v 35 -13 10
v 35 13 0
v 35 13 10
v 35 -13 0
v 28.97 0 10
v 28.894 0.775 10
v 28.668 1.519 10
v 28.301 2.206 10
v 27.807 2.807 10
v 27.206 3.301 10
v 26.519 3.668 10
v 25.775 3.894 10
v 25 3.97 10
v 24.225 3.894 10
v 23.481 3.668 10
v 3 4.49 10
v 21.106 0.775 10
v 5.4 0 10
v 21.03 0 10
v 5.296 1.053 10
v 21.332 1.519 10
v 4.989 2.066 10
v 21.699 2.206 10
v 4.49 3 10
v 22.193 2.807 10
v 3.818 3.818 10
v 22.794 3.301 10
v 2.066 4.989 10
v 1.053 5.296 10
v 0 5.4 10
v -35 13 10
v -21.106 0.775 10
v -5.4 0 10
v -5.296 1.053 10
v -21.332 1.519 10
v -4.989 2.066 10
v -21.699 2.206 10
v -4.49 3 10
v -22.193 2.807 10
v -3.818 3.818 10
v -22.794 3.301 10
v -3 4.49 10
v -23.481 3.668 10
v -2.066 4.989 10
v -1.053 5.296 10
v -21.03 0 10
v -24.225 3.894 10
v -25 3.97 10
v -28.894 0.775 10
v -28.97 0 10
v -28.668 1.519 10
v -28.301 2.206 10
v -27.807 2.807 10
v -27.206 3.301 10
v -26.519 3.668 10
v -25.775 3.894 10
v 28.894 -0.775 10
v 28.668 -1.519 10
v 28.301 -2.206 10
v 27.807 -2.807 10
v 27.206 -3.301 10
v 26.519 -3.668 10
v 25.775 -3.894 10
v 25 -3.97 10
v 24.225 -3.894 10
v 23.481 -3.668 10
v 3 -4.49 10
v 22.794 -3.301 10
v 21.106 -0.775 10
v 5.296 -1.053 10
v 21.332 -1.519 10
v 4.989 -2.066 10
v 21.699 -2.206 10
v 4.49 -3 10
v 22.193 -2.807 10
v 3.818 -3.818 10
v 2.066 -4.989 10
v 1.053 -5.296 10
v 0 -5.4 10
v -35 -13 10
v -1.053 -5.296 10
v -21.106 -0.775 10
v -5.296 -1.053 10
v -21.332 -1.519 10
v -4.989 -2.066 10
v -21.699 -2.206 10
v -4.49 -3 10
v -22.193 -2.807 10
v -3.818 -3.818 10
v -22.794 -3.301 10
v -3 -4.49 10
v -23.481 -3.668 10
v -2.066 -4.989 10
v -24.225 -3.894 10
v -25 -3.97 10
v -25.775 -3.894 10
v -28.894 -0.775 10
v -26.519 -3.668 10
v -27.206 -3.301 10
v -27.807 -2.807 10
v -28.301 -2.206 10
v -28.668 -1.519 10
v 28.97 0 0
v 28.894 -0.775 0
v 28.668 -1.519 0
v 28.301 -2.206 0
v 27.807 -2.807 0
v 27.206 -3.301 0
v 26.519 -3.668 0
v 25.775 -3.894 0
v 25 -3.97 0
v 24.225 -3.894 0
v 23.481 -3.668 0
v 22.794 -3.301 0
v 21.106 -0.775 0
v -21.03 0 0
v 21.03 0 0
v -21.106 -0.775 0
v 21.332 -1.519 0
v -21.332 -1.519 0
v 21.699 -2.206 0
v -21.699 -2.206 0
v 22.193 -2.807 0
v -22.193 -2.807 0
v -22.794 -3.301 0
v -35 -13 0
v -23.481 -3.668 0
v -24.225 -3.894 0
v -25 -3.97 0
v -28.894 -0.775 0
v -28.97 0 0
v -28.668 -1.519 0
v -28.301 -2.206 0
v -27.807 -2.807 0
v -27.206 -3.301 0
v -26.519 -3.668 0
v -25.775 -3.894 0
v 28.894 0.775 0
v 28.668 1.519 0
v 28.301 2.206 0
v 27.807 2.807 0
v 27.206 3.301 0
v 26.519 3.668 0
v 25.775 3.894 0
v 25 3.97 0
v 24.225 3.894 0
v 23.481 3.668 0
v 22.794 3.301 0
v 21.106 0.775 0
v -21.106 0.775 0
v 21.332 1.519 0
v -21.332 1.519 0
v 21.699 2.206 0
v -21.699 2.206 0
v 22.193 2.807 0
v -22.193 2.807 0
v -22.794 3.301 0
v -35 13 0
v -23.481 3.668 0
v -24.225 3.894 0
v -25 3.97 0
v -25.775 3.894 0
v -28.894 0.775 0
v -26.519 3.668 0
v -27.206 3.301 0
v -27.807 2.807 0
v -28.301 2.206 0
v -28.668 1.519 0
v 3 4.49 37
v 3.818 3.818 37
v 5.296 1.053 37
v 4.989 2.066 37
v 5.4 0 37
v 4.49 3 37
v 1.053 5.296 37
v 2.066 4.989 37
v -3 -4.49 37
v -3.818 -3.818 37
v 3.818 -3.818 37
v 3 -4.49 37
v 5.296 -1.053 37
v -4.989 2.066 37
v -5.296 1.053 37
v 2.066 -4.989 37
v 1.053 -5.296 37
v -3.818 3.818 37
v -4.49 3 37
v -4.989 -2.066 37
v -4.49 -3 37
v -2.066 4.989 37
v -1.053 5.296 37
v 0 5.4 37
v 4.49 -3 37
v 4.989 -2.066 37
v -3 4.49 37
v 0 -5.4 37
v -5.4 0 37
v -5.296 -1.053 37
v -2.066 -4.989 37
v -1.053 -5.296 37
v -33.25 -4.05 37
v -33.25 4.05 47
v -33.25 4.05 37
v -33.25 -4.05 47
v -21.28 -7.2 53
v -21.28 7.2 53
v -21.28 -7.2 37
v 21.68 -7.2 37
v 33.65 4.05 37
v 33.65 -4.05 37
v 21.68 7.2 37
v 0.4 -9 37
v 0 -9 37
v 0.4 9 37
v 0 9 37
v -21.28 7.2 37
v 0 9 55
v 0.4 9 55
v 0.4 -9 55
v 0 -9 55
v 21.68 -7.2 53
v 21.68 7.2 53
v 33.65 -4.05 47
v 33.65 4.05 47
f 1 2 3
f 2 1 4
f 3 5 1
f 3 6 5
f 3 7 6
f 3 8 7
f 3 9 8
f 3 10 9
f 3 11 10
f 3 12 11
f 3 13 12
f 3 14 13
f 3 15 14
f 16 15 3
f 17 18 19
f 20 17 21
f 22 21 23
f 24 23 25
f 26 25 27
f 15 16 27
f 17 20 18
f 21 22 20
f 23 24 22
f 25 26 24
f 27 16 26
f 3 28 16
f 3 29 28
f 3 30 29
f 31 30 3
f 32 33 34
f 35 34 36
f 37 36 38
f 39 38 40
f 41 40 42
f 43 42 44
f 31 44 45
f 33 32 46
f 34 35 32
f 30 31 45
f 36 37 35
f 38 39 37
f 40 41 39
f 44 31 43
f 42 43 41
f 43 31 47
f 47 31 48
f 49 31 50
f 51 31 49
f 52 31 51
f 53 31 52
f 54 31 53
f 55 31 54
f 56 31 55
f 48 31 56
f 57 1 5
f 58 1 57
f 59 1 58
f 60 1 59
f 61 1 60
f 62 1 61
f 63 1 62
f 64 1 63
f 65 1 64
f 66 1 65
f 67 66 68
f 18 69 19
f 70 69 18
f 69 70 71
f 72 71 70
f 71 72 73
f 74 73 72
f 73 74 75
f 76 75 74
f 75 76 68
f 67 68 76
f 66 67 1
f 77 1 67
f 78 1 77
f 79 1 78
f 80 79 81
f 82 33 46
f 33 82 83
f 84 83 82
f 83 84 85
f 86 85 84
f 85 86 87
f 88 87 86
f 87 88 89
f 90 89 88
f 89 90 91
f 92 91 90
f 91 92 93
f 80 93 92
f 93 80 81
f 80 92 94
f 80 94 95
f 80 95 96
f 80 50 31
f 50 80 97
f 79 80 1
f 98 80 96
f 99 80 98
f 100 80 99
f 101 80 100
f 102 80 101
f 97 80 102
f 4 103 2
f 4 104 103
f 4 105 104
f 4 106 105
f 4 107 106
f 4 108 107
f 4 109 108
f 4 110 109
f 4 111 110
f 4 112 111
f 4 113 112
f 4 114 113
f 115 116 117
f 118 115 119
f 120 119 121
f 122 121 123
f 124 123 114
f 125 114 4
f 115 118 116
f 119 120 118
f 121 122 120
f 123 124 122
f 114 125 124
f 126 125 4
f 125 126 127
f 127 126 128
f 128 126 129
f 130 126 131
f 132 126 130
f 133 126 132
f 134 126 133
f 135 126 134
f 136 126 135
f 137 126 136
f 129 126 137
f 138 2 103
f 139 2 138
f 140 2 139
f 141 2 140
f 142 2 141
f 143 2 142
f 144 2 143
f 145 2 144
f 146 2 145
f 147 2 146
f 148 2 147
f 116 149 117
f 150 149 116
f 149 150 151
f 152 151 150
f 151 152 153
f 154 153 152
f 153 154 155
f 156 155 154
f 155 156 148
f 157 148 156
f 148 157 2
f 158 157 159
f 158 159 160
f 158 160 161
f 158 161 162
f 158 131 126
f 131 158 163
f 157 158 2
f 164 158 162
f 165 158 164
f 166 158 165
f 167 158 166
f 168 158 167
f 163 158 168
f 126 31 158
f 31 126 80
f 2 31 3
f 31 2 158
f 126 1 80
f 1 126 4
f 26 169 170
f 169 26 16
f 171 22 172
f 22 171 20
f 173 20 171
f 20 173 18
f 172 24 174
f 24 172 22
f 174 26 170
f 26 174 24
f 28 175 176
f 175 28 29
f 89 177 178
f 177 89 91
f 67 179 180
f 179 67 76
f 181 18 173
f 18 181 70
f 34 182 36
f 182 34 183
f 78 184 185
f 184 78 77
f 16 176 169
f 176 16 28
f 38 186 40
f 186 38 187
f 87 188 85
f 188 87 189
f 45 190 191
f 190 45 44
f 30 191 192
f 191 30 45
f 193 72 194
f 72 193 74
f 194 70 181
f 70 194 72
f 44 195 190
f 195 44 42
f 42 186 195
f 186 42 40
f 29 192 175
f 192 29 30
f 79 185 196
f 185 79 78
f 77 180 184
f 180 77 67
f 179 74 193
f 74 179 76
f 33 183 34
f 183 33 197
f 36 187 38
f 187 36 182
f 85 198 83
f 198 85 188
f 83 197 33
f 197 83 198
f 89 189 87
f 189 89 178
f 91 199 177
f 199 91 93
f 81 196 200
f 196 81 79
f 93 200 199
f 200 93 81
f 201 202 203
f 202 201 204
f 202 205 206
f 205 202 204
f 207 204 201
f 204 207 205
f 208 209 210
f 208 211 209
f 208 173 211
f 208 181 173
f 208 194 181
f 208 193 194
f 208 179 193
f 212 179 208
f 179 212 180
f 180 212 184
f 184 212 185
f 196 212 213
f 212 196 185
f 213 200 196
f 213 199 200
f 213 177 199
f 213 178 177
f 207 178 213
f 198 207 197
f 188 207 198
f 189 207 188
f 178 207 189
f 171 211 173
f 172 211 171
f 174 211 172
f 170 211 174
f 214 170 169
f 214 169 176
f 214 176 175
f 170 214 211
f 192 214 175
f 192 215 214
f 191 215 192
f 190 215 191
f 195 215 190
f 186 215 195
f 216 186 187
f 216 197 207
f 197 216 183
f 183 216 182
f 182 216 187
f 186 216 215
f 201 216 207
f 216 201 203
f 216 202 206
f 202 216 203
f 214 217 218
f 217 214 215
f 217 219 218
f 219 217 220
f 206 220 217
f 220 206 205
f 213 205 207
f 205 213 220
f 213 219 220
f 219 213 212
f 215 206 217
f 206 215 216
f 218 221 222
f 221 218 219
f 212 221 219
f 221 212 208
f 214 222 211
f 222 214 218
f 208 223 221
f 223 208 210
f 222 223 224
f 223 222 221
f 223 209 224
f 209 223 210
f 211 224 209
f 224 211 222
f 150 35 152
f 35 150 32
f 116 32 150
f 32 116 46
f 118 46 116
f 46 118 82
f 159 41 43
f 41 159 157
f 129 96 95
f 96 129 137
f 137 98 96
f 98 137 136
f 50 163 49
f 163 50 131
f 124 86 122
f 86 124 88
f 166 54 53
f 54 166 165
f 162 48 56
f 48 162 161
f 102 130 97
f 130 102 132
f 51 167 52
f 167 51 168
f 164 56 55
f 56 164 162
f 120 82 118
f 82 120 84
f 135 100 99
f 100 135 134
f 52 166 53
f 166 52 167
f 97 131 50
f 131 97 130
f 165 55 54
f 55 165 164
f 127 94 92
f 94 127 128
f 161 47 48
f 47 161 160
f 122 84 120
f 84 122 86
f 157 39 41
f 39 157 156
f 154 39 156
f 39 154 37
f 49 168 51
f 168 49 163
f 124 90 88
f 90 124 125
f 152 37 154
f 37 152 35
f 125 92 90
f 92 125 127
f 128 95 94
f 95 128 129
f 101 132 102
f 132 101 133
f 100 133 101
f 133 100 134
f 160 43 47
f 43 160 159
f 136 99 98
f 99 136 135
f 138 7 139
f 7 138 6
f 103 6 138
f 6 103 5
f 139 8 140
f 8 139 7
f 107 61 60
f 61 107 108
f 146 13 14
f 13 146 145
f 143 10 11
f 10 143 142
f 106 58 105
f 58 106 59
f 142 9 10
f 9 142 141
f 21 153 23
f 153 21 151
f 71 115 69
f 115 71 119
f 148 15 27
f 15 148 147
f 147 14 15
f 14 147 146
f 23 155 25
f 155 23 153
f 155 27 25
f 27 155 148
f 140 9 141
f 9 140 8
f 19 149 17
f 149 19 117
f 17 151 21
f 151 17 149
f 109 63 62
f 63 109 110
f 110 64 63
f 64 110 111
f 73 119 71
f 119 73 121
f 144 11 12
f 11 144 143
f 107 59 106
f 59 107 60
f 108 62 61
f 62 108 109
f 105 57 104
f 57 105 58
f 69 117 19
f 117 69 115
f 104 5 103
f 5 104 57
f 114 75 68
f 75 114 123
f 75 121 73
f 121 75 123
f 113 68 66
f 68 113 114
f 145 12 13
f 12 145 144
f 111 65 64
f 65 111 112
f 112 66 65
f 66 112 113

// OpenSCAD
$fn = 32;

// ----------------------------------------------------------------------
// Boat cleat: 70 mm base, horn 46 mm up
// ----------------------------------------------------------------------

// --- parameters (mm) ---
base_l = 70;              // base length
base_w = 26;              // base width
base_t = 10;              // base thickness
horn_len = 66.5;          // horn length
horn_d = 18;              // horn diameter at the middle
horn_z = 46;              // horn axis height
end_drop = 8;             // how far the horn tips drop
post_d = 10.8;            // centre post diameter
holes_d = 7.94;           // fixing holes
hole_x = 25;              // fixing hole spacing

difference() {
  union() {
    translate([-35, -13, 0]) cube([base_l, base_w, base_t]);
    /* centre post, sunk 1 mm into the base */
    translate([0, 0, 9]) cylinder(h = 37, d = post_d);
    /* horn: a hull chain of boxes, full in the middle and lighter at the tips */
    hull() {
      translate([-33.25, -4.05, 37]) cube([0.4, 8.1, 10], center = false);
      translate([-21.28, -7.2, 37]) cube([0.4, 14.4, 16], center = false);
    }
    hull() {
      translate([-21.28, -7.2, 37]) cube([0.4, 14.4, 16], center = false);
      translate([0, -9, 37]) cube([0.4, 18, 18], center = false);
    }
    hull() {
      translate([0, -9, 37]) cube([0.4, 18, 18], center = false);
      translate([21.28, -7.2, 37]) cube([0.4, 14.4, 16], center = false);
    }
    hull() {
      translate([21.28, -7.2, 37]) cube([0.4, 14.4, 16], center = false);
      translate([33.25, -4.05, 37]) cube([0.4, 8.1, 10], center = false);
    }
  }
  translate([-25, 0, -2.5]) cylinder(h = base_t + 5, d = holes_d);
  translate([25, 0, -2.5]) cylinder(h = base_t + 5, d = holes_d);
}
